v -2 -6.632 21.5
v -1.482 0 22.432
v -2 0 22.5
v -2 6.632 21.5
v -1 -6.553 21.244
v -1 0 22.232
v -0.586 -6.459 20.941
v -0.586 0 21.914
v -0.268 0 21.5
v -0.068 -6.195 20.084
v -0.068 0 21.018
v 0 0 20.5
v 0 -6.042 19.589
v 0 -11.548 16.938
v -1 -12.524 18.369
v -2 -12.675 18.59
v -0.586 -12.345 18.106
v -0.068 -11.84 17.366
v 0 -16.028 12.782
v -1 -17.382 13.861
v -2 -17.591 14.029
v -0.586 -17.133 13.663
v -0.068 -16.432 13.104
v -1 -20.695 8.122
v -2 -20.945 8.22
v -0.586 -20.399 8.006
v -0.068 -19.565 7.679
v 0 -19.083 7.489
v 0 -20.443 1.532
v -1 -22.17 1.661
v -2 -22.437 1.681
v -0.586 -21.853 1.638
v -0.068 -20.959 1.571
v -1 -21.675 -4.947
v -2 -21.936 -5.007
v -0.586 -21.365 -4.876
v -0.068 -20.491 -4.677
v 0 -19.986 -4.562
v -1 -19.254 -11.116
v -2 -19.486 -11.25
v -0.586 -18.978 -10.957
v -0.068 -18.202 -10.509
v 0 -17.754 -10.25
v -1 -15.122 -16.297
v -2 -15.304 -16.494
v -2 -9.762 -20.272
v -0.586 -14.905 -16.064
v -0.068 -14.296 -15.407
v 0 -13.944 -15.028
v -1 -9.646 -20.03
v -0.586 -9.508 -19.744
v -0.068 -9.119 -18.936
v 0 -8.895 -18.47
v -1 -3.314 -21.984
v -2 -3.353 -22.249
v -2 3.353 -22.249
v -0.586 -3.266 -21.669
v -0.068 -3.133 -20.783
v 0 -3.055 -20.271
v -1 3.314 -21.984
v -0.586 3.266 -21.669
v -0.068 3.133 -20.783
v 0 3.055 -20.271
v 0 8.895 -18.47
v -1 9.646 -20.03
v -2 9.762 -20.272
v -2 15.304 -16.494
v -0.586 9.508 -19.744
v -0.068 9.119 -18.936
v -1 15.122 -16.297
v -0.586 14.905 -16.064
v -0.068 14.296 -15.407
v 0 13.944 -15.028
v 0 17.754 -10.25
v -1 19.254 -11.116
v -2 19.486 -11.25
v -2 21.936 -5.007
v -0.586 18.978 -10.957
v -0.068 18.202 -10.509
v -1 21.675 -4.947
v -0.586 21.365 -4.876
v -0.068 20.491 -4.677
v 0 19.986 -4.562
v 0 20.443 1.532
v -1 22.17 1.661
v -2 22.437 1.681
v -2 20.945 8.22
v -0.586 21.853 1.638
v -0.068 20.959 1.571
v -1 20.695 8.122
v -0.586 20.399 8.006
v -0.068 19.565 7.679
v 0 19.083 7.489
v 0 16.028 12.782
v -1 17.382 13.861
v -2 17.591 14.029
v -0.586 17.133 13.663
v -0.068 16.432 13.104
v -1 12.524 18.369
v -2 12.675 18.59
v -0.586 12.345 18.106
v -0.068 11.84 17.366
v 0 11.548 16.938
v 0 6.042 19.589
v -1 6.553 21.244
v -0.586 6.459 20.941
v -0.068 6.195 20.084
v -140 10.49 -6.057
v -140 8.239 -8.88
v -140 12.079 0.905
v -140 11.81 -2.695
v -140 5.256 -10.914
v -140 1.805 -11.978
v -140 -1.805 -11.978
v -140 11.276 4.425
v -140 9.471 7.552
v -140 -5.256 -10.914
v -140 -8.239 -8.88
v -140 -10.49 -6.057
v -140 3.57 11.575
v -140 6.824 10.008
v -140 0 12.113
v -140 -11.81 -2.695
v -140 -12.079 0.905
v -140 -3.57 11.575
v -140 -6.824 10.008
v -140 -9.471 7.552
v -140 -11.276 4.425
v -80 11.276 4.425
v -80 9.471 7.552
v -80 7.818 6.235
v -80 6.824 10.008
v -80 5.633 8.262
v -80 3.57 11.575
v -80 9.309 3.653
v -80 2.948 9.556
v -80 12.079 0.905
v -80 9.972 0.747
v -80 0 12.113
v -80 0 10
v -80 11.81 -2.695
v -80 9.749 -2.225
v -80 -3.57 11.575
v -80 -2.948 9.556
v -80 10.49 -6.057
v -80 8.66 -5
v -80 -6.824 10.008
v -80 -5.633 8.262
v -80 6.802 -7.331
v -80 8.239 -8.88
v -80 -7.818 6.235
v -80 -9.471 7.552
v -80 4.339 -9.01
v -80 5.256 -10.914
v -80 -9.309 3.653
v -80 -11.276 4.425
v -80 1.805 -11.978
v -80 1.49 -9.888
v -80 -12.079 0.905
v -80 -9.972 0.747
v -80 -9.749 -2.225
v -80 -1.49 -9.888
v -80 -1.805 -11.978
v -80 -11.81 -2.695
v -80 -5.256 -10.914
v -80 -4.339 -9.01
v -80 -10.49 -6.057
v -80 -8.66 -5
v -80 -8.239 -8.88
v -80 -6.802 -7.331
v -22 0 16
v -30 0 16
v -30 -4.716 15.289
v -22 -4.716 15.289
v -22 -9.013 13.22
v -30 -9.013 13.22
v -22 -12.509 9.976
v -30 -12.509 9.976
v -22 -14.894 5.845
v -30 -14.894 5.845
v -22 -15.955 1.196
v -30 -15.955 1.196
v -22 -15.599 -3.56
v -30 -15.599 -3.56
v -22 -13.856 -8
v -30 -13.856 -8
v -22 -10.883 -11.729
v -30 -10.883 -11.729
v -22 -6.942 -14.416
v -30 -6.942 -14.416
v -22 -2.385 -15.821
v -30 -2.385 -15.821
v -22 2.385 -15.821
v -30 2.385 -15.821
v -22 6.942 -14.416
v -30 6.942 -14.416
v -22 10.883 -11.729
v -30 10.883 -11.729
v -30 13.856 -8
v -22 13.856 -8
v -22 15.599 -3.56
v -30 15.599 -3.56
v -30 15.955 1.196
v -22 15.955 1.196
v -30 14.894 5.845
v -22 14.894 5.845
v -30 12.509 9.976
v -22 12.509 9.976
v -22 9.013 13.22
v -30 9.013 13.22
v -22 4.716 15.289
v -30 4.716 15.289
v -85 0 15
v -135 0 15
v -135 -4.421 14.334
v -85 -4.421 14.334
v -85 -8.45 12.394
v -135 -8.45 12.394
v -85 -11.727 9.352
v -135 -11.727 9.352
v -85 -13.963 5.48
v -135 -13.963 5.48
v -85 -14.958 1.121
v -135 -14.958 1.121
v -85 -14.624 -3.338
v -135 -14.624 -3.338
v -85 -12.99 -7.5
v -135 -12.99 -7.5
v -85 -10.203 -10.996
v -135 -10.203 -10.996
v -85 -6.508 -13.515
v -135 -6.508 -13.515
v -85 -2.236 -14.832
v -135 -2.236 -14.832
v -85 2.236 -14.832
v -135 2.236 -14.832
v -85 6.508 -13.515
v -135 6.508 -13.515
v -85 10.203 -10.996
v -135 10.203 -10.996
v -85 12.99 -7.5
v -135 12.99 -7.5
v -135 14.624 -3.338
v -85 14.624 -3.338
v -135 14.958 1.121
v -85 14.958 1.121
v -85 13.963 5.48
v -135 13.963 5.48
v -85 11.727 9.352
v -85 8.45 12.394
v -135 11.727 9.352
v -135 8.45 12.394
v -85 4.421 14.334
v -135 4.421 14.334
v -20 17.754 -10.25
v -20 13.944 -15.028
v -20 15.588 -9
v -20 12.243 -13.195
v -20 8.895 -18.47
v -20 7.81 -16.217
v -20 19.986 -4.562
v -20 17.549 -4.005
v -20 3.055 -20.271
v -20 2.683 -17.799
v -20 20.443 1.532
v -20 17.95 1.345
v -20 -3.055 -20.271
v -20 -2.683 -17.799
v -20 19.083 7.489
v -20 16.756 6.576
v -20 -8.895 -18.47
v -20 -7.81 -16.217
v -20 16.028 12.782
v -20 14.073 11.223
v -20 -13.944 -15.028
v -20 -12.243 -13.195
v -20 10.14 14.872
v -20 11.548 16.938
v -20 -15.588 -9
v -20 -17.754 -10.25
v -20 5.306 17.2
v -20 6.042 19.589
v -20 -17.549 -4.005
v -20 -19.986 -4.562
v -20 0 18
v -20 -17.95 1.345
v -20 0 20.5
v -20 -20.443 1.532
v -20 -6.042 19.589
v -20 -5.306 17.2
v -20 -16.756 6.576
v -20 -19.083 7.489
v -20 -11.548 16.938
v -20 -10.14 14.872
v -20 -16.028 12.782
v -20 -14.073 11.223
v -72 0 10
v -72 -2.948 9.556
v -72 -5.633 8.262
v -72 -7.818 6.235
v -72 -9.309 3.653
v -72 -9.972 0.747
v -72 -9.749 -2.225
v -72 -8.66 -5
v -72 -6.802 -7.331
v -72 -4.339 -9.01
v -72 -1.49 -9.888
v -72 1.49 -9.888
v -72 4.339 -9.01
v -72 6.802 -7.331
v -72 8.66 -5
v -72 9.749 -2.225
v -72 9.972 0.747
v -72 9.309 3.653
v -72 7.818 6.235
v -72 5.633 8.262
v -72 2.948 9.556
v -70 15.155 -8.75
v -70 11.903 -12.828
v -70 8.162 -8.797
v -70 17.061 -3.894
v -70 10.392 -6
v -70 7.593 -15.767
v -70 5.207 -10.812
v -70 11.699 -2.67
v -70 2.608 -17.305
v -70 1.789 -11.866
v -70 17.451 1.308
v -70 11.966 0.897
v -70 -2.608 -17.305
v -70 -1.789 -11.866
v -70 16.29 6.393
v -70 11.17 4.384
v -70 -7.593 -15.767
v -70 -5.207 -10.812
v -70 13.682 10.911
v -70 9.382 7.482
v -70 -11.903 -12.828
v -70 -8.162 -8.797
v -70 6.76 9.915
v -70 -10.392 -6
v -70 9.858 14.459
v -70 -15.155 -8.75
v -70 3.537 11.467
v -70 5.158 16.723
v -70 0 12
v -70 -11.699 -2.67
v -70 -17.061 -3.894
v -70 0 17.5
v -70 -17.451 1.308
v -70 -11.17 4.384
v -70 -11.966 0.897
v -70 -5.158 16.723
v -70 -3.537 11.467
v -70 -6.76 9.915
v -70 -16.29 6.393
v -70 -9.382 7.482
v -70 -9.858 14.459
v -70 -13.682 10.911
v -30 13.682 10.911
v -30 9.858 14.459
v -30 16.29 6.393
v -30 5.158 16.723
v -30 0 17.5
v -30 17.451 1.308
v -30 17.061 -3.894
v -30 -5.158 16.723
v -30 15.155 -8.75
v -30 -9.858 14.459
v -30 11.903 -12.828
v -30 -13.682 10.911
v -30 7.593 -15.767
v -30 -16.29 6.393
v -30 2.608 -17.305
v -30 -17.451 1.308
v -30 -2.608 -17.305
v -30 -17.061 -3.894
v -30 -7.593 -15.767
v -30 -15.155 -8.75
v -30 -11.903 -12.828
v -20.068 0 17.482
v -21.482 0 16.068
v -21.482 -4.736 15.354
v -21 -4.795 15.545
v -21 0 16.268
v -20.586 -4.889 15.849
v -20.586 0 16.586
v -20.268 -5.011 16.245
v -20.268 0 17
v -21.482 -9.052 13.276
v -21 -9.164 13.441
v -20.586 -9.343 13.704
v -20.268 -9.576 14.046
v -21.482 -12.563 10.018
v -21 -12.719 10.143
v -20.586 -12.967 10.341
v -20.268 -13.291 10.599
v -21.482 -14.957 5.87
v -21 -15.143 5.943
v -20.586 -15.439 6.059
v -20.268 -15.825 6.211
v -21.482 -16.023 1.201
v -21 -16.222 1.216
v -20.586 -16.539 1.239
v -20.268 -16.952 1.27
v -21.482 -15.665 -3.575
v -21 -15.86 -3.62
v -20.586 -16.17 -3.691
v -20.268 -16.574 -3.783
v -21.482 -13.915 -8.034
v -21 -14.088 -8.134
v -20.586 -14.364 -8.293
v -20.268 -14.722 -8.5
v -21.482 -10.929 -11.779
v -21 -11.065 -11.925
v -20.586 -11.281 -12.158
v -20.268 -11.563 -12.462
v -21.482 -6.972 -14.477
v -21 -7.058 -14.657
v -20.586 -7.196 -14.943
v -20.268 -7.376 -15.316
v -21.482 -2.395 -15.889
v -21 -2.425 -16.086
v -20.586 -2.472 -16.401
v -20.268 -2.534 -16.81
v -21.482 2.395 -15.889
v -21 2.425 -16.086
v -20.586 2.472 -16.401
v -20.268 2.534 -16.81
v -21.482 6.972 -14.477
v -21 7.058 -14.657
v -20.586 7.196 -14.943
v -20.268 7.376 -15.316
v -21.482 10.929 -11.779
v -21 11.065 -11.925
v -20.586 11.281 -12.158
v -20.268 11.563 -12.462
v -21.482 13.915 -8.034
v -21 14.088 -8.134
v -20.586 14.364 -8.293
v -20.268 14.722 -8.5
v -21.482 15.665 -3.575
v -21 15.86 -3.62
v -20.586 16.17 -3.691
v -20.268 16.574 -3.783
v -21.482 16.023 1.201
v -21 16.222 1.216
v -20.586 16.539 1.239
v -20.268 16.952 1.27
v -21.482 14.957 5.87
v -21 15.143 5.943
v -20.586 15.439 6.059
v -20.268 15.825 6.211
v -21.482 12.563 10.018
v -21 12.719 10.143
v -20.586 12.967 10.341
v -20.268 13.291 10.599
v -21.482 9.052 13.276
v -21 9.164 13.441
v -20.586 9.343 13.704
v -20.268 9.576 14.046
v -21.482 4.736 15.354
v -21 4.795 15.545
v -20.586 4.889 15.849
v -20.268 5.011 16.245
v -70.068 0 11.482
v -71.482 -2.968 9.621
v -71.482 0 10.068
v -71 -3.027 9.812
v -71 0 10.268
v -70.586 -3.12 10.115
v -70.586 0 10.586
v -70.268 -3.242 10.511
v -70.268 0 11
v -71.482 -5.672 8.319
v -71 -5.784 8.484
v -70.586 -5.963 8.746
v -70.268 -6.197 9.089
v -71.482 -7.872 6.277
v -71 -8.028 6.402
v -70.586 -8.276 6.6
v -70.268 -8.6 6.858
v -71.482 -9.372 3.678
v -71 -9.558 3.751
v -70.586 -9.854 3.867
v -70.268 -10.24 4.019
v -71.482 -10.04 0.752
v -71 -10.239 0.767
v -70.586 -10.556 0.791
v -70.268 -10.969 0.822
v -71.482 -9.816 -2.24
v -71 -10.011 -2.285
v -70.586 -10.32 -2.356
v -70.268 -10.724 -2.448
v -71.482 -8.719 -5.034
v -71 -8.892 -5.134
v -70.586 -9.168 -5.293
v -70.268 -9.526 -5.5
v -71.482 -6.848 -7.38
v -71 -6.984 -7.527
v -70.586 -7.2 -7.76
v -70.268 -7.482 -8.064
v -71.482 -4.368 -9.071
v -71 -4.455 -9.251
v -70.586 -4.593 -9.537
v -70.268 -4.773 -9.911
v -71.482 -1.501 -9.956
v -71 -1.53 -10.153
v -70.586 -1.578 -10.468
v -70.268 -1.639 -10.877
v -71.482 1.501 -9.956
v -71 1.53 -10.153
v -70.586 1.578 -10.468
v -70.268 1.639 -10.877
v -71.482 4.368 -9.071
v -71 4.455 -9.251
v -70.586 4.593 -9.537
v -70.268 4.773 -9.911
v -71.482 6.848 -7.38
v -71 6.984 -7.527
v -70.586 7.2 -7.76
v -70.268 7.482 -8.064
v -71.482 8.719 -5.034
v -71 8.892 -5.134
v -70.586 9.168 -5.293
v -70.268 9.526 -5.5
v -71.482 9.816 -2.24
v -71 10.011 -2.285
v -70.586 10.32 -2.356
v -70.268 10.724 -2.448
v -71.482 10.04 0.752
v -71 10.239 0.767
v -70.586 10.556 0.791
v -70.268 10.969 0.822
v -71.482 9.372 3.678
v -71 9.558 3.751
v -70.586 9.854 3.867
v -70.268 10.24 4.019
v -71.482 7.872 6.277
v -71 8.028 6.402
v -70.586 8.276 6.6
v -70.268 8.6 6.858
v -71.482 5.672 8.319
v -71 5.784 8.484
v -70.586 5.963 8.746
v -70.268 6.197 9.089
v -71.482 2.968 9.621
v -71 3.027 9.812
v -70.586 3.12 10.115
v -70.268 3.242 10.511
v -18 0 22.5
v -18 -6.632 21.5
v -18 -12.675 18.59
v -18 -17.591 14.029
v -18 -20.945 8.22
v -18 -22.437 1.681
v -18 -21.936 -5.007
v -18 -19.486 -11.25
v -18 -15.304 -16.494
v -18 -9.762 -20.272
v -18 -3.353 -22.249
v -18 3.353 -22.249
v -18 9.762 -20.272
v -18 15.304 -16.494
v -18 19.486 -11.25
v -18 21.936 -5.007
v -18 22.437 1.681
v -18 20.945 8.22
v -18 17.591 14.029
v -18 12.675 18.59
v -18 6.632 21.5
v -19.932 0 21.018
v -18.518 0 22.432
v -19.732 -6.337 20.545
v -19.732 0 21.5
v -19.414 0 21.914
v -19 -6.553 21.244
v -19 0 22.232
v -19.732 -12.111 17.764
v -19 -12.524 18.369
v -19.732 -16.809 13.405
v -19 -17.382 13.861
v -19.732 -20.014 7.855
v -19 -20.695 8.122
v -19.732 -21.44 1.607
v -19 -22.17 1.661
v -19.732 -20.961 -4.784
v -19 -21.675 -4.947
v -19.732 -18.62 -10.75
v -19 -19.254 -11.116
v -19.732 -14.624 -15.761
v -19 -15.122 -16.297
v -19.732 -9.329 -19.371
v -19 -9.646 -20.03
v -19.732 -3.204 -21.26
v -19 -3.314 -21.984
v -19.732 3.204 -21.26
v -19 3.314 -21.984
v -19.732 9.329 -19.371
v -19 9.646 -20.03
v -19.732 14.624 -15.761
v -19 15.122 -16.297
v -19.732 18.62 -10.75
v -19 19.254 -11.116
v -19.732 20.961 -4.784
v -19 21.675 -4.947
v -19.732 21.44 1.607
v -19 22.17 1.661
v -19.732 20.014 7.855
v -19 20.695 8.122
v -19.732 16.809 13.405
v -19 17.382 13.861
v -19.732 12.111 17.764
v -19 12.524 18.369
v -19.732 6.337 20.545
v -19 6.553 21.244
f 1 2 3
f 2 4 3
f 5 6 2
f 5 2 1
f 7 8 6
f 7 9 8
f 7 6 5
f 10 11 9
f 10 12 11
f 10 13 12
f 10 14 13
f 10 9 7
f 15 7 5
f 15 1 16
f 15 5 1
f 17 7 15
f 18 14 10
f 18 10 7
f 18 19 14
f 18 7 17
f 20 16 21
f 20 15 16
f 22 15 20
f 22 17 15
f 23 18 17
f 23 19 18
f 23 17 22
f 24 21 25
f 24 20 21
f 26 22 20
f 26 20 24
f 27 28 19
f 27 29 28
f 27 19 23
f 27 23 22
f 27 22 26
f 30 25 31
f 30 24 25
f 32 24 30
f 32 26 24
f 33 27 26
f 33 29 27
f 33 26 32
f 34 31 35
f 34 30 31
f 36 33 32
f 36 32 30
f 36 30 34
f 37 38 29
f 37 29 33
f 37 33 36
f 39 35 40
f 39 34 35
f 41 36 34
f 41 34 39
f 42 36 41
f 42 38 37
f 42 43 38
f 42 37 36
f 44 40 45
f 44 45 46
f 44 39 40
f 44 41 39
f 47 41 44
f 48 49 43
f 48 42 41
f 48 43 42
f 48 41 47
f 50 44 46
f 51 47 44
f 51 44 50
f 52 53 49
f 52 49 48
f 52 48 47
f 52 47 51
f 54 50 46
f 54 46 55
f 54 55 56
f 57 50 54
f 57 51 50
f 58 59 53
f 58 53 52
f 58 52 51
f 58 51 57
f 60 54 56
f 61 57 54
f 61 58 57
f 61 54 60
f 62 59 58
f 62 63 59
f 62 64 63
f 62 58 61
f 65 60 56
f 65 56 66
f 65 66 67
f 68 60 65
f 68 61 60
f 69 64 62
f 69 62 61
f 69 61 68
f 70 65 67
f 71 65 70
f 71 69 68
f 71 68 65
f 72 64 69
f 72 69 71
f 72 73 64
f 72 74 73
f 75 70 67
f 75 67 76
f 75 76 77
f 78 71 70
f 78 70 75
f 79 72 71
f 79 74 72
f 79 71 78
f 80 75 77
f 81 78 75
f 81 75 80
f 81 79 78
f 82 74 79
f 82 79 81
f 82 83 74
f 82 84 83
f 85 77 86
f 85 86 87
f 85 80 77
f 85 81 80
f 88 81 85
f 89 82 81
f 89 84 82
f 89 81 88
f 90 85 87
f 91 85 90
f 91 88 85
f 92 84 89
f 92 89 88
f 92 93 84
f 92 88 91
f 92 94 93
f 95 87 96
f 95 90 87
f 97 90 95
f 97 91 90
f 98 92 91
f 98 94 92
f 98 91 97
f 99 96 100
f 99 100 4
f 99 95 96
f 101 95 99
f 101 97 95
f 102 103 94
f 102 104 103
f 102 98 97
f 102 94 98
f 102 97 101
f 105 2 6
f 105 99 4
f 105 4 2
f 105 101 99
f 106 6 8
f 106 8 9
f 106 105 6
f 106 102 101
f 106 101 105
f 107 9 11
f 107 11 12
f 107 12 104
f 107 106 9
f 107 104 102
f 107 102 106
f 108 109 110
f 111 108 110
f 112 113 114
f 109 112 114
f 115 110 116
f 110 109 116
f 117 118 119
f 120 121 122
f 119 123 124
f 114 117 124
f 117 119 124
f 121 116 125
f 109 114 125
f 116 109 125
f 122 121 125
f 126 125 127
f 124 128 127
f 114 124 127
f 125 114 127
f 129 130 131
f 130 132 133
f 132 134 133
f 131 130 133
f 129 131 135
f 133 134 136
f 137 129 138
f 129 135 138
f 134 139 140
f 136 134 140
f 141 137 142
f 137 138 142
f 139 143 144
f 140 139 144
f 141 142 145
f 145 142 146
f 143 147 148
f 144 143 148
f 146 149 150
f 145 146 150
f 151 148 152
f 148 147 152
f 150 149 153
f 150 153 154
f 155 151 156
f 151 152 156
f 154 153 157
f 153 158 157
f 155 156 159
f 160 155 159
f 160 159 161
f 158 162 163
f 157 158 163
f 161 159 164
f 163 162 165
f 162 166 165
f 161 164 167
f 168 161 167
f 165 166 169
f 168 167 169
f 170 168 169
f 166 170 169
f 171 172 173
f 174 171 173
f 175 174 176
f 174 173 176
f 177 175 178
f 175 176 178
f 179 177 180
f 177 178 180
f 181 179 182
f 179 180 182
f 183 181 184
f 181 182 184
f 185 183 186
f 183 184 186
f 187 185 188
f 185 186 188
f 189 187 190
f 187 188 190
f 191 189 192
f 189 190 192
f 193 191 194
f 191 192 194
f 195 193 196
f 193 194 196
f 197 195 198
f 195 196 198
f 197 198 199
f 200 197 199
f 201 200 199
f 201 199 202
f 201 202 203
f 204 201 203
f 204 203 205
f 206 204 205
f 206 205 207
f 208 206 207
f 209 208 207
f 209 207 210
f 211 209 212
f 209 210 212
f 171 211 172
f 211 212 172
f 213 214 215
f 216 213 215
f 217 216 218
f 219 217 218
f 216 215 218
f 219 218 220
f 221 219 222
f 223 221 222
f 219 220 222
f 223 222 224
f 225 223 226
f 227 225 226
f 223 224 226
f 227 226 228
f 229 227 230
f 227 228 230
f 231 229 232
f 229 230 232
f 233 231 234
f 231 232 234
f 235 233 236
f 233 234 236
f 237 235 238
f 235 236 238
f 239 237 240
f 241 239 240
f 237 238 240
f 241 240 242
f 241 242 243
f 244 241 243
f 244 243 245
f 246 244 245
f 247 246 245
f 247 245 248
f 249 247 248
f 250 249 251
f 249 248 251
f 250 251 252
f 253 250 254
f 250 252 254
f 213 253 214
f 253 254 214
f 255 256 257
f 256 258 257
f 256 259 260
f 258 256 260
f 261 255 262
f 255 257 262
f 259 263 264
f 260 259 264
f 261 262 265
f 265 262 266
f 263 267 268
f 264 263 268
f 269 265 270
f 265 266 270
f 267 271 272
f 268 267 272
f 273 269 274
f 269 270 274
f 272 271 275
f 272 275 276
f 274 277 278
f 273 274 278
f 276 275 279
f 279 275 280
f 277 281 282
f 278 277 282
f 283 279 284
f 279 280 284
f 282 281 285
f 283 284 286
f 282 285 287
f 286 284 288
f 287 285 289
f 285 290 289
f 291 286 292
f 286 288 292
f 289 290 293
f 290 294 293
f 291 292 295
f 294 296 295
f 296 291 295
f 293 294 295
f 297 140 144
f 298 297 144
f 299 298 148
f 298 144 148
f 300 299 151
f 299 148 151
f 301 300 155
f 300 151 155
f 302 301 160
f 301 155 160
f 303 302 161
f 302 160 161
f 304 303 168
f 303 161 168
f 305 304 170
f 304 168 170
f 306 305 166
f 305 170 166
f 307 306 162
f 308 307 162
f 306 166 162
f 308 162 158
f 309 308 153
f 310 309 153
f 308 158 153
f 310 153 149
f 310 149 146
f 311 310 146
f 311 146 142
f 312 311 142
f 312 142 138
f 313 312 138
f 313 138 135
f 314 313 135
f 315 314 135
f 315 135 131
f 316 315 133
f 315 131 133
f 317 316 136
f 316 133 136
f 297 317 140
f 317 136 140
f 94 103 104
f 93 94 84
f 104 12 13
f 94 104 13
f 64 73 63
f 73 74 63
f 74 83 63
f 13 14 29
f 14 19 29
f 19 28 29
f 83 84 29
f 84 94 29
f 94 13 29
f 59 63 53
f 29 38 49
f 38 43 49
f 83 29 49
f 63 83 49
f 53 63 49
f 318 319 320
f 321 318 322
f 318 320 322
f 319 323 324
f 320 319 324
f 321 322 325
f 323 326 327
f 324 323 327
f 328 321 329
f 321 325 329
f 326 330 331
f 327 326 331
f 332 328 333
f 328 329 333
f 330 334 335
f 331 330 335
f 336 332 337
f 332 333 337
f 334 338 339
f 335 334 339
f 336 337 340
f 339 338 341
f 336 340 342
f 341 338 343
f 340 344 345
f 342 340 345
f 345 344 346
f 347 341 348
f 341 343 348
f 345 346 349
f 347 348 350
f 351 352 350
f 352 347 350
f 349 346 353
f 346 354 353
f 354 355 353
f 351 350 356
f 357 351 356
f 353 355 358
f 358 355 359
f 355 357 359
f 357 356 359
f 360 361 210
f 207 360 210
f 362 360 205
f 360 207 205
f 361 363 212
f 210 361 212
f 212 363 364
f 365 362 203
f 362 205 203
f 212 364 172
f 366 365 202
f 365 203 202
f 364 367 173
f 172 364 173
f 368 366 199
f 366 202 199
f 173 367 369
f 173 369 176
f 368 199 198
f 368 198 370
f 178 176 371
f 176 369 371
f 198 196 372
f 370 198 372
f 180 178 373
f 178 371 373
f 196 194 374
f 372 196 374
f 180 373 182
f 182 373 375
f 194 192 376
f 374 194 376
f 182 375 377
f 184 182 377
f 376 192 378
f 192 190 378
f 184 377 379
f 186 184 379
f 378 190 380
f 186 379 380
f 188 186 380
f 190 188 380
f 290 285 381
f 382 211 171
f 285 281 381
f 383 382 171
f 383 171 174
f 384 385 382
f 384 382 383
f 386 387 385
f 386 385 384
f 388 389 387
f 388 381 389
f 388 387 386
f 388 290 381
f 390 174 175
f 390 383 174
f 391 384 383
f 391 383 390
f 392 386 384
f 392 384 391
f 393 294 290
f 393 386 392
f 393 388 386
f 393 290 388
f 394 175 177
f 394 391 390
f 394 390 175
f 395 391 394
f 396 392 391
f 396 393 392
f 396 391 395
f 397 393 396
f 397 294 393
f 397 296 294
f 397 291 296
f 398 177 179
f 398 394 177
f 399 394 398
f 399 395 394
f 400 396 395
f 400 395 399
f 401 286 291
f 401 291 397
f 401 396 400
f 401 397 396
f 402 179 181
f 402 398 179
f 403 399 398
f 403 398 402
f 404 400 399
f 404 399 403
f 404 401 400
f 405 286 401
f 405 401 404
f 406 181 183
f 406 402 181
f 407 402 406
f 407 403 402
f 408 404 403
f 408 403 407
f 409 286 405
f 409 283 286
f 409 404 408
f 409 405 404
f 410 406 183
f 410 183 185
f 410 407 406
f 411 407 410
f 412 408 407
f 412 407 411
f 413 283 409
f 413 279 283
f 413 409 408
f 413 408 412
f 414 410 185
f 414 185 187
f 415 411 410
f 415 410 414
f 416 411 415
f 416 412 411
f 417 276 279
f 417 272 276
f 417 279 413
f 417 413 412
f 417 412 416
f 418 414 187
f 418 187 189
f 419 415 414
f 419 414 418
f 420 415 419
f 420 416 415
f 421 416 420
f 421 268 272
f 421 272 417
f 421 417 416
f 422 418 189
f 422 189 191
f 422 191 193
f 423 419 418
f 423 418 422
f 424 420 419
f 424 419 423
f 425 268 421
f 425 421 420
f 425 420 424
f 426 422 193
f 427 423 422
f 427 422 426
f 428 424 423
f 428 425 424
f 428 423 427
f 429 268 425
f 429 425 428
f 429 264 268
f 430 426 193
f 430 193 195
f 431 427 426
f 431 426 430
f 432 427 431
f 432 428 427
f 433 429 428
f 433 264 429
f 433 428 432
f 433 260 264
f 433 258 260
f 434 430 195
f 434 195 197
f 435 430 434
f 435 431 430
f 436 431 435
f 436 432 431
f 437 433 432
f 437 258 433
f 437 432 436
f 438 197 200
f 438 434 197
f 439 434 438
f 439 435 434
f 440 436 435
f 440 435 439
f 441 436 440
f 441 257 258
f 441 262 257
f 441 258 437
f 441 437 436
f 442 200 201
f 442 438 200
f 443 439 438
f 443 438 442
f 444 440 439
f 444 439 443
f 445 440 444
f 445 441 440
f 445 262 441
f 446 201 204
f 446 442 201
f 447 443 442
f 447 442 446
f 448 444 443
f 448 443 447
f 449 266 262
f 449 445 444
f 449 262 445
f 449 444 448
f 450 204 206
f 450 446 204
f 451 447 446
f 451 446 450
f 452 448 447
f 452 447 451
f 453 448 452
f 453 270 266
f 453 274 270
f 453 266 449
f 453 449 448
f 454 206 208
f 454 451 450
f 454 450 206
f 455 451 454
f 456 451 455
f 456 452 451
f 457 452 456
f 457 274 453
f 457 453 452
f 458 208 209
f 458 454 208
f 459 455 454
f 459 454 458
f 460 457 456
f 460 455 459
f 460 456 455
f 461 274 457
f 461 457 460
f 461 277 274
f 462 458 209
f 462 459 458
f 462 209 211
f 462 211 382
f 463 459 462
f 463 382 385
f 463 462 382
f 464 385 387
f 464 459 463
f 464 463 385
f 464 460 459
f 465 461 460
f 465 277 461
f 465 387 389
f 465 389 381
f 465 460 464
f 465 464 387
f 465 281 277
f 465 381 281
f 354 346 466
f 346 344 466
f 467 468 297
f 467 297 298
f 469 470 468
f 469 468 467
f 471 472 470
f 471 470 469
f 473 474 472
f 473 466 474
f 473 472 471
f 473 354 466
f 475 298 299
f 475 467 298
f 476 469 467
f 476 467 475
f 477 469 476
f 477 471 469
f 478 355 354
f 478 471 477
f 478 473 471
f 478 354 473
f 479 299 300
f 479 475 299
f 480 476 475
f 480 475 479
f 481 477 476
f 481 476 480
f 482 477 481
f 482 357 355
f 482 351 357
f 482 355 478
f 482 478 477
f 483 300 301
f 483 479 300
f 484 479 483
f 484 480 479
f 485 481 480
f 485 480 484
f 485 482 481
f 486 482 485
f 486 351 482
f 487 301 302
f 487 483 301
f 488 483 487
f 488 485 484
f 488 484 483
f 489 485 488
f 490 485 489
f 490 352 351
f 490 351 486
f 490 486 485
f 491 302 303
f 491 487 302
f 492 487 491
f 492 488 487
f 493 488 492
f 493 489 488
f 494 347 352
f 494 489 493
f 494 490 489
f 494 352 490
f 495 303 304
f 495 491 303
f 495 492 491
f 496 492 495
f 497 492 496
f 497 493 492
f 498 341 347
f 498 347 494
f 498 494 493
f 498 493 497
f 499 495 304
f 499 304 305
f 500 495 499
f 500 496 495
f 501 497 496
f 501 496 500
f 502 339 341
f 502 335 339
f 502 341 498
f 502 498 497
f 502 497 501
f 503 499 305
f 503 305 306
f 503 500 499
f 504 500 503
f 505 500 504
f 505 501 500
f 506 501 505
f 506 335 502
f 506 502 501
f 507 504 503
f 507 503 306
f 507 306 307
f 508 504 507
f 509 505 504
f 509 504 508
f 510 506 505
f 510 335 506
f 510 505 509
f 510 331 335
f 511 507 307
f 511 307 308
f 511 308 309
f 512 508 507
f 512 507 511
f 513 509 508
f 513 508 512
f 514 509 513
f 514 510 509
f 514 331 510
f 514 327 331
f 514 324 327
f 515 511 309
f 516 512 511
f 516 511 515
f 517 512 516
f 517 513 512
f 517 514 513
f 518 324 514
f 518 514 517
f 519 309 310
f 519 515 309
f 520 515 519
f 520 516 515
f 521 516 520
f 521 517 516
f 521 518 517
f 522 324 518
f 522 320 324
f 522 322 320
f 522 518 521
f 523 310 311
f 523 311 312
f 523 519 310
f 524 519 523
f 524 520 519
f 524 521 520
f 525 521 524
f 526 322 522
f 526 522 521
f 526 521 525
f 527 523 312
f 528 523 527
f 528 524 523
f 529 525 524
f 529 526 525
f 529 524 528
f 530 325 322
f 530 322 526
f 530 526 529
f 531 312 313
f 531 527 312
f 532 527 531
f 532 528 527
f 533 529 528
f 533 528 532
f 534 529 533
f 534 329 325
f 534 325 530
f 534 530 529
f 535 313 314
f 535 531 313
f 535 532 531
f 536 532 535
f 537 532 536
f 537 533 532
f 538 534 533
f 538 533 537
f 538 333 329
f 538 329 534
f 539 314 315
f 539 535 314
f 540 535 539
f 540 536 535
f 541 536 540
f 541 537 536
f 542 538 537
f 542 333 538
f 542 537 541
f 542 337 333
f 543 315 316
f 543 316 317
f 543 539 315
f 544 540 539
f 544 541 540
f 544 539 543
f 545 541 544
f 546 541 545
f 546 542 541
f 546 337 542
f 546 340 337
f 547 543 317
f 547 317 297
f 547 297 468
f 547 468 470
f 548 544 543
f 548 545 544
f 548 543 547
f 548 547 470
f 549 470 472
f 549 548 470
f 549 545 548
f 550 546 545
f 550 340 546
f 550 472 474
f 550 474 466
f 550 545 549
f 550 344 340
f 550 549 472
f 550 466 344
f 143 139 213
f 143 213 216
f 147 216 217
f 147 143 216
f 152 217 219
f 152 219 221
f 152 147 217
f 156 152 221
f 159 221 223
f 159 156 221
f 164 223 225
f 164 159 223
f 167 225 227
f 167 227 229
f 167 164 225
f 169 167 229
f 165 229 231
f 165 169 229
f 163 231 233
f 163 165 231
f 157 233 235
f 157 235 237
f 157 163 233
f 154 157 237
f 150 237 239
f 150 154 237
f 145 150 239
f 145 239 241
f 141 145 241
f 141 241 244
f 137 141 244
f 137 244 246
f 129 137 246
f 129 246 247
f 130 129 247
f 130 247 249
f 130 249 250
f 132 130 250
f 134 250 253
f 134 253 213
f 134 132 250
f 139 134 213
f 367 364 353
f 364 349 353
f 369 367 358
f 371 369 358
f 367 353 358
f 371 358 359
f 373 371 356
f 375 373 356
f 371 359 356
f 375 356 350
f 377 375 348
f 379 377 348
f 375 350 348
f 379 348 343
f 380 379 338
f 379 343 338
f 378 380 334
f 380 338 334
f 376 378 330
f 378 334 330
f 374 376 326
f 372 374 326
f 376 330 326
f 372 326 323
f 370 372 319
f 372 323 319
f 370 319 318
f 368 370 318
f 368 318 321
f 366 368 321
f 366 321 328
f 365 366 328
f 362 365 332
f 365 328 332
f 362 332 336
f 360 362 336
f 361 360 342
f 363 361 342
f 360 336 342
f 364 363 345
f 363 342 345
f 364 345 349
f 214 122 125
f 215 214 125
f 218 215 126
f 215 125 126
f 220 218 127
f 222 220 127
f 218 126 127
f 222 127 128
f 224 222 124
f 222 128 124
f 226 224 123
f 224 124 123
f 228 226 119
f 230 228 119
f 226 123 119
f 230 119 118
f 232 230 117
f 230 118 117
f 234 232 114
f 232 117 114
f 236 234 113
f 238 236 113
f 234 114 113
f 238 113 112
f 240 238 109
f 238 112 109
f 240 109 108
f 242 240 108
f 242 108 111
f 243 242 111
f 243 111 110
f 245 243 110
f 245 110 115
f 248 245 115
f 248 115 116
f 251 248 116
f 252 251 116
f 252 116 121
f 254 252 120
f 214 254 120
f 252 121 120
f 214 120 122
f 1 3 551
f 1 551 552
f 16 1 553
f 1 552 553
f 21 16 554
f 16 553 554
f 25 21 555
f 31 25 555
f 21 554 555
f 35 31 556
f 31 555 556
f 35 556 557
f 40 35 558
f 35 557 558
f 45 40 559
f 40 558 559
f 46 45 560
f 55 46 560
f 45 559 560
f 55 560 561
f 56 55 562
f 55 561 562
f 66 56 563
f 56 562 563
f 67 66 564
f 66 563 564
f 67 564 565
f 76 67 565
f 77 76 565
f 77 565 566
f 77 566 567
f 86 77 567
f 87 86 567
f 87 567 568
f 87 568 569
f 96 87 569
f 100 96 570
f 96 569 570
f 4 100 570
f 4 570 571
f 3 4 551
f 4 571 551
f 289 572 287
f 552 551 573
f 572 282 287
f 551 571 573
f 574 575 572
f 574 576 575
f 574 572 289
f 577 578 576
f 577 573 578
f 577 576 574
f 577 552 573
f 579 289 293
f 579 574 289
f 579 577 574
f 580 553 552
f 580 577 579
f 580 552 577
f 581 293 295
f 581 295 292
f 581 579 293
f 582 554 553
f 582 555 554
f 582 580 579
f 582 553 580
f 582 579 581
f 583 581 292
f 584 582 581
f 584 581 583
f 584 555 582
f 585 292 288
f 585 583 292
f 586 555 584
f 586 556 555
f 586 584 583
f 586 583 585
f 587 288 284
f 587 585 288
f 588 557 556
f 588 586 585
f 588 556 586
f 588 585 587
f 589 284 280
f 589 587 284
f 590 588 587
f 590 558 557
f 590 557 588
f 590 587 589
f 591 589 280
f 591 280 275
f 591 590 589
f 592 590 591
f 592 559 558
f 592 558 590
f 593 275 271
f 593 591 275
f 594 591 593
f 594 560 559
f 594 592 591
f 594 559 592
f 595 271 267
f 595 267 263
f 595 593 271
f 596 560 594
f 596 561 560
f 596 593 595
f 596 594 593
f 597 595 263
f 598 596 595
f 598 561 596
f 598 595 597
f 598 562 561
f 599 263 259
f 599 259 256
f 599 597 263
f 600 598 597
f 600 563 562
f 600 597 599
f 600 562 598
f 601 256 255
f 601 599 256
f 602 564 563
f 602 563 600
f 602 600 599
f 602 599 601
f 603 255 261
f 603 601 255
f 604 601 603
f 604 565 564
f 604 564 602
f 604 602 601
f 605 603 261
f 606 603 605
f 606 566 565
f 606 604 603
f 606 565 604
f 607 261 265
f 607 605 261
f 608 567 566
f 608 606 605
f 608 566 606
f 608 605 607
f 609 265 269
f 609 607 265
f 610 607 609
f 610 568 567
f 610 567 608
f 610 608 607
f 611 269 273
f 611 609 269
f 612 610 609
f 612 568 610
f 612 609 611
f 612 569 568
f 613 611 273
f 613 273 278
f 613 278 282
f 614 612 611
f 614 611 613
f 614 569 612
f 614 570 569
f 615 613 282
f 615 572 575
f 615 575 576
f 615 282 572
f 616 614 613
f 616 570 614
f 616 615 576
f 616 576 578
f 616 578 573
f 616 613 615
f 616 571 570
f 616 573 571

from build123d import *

# Parameters (mm, degrees)
F2_SIZE2 = 2.8867513459
F2_SIZE  = 5
F3_R     = 2


with BuildPart() as f1:
    # F0 (on Front) → F1 (revolve)
    with BuildSketch(Plane.XZ):
        Polygon((-140, 0), (0, 0), (0, 22.5), (-20, 22.5), (-20, 16), (-30, 16), (-30, 17.5), (-70, 17.5), (-70, 10), (-80, 10), (-80, 15), (-140, 15), align=None)
    revolve(axis=Axis((-70, 0, 0), (1, 0, 0)))

    # F2
    f2_edges = [f1.edges().sort_by_distance(p)[0] for p in [
        (-140, 0, -15),
        (-80, 0, -15),
    ]]
    f2_side = f1.faces().sort_by_distance((-110, 0, -15))[0]
    chamfer(f2_edges, length=F2_SIZE, length2=F2_SIZE2, reference=f2_side)

    # F3
    f3_edges = [f1.edges().sort_by_distance(p)[0] for p in [
        (-70, 0, -10),
        (-20, 0, -22.5),
        (0, 0, -22.5),
        (-20, 0, -16),
    ]]
    fillet(f3_edges, radius=F3_R)


solid = f1.part
